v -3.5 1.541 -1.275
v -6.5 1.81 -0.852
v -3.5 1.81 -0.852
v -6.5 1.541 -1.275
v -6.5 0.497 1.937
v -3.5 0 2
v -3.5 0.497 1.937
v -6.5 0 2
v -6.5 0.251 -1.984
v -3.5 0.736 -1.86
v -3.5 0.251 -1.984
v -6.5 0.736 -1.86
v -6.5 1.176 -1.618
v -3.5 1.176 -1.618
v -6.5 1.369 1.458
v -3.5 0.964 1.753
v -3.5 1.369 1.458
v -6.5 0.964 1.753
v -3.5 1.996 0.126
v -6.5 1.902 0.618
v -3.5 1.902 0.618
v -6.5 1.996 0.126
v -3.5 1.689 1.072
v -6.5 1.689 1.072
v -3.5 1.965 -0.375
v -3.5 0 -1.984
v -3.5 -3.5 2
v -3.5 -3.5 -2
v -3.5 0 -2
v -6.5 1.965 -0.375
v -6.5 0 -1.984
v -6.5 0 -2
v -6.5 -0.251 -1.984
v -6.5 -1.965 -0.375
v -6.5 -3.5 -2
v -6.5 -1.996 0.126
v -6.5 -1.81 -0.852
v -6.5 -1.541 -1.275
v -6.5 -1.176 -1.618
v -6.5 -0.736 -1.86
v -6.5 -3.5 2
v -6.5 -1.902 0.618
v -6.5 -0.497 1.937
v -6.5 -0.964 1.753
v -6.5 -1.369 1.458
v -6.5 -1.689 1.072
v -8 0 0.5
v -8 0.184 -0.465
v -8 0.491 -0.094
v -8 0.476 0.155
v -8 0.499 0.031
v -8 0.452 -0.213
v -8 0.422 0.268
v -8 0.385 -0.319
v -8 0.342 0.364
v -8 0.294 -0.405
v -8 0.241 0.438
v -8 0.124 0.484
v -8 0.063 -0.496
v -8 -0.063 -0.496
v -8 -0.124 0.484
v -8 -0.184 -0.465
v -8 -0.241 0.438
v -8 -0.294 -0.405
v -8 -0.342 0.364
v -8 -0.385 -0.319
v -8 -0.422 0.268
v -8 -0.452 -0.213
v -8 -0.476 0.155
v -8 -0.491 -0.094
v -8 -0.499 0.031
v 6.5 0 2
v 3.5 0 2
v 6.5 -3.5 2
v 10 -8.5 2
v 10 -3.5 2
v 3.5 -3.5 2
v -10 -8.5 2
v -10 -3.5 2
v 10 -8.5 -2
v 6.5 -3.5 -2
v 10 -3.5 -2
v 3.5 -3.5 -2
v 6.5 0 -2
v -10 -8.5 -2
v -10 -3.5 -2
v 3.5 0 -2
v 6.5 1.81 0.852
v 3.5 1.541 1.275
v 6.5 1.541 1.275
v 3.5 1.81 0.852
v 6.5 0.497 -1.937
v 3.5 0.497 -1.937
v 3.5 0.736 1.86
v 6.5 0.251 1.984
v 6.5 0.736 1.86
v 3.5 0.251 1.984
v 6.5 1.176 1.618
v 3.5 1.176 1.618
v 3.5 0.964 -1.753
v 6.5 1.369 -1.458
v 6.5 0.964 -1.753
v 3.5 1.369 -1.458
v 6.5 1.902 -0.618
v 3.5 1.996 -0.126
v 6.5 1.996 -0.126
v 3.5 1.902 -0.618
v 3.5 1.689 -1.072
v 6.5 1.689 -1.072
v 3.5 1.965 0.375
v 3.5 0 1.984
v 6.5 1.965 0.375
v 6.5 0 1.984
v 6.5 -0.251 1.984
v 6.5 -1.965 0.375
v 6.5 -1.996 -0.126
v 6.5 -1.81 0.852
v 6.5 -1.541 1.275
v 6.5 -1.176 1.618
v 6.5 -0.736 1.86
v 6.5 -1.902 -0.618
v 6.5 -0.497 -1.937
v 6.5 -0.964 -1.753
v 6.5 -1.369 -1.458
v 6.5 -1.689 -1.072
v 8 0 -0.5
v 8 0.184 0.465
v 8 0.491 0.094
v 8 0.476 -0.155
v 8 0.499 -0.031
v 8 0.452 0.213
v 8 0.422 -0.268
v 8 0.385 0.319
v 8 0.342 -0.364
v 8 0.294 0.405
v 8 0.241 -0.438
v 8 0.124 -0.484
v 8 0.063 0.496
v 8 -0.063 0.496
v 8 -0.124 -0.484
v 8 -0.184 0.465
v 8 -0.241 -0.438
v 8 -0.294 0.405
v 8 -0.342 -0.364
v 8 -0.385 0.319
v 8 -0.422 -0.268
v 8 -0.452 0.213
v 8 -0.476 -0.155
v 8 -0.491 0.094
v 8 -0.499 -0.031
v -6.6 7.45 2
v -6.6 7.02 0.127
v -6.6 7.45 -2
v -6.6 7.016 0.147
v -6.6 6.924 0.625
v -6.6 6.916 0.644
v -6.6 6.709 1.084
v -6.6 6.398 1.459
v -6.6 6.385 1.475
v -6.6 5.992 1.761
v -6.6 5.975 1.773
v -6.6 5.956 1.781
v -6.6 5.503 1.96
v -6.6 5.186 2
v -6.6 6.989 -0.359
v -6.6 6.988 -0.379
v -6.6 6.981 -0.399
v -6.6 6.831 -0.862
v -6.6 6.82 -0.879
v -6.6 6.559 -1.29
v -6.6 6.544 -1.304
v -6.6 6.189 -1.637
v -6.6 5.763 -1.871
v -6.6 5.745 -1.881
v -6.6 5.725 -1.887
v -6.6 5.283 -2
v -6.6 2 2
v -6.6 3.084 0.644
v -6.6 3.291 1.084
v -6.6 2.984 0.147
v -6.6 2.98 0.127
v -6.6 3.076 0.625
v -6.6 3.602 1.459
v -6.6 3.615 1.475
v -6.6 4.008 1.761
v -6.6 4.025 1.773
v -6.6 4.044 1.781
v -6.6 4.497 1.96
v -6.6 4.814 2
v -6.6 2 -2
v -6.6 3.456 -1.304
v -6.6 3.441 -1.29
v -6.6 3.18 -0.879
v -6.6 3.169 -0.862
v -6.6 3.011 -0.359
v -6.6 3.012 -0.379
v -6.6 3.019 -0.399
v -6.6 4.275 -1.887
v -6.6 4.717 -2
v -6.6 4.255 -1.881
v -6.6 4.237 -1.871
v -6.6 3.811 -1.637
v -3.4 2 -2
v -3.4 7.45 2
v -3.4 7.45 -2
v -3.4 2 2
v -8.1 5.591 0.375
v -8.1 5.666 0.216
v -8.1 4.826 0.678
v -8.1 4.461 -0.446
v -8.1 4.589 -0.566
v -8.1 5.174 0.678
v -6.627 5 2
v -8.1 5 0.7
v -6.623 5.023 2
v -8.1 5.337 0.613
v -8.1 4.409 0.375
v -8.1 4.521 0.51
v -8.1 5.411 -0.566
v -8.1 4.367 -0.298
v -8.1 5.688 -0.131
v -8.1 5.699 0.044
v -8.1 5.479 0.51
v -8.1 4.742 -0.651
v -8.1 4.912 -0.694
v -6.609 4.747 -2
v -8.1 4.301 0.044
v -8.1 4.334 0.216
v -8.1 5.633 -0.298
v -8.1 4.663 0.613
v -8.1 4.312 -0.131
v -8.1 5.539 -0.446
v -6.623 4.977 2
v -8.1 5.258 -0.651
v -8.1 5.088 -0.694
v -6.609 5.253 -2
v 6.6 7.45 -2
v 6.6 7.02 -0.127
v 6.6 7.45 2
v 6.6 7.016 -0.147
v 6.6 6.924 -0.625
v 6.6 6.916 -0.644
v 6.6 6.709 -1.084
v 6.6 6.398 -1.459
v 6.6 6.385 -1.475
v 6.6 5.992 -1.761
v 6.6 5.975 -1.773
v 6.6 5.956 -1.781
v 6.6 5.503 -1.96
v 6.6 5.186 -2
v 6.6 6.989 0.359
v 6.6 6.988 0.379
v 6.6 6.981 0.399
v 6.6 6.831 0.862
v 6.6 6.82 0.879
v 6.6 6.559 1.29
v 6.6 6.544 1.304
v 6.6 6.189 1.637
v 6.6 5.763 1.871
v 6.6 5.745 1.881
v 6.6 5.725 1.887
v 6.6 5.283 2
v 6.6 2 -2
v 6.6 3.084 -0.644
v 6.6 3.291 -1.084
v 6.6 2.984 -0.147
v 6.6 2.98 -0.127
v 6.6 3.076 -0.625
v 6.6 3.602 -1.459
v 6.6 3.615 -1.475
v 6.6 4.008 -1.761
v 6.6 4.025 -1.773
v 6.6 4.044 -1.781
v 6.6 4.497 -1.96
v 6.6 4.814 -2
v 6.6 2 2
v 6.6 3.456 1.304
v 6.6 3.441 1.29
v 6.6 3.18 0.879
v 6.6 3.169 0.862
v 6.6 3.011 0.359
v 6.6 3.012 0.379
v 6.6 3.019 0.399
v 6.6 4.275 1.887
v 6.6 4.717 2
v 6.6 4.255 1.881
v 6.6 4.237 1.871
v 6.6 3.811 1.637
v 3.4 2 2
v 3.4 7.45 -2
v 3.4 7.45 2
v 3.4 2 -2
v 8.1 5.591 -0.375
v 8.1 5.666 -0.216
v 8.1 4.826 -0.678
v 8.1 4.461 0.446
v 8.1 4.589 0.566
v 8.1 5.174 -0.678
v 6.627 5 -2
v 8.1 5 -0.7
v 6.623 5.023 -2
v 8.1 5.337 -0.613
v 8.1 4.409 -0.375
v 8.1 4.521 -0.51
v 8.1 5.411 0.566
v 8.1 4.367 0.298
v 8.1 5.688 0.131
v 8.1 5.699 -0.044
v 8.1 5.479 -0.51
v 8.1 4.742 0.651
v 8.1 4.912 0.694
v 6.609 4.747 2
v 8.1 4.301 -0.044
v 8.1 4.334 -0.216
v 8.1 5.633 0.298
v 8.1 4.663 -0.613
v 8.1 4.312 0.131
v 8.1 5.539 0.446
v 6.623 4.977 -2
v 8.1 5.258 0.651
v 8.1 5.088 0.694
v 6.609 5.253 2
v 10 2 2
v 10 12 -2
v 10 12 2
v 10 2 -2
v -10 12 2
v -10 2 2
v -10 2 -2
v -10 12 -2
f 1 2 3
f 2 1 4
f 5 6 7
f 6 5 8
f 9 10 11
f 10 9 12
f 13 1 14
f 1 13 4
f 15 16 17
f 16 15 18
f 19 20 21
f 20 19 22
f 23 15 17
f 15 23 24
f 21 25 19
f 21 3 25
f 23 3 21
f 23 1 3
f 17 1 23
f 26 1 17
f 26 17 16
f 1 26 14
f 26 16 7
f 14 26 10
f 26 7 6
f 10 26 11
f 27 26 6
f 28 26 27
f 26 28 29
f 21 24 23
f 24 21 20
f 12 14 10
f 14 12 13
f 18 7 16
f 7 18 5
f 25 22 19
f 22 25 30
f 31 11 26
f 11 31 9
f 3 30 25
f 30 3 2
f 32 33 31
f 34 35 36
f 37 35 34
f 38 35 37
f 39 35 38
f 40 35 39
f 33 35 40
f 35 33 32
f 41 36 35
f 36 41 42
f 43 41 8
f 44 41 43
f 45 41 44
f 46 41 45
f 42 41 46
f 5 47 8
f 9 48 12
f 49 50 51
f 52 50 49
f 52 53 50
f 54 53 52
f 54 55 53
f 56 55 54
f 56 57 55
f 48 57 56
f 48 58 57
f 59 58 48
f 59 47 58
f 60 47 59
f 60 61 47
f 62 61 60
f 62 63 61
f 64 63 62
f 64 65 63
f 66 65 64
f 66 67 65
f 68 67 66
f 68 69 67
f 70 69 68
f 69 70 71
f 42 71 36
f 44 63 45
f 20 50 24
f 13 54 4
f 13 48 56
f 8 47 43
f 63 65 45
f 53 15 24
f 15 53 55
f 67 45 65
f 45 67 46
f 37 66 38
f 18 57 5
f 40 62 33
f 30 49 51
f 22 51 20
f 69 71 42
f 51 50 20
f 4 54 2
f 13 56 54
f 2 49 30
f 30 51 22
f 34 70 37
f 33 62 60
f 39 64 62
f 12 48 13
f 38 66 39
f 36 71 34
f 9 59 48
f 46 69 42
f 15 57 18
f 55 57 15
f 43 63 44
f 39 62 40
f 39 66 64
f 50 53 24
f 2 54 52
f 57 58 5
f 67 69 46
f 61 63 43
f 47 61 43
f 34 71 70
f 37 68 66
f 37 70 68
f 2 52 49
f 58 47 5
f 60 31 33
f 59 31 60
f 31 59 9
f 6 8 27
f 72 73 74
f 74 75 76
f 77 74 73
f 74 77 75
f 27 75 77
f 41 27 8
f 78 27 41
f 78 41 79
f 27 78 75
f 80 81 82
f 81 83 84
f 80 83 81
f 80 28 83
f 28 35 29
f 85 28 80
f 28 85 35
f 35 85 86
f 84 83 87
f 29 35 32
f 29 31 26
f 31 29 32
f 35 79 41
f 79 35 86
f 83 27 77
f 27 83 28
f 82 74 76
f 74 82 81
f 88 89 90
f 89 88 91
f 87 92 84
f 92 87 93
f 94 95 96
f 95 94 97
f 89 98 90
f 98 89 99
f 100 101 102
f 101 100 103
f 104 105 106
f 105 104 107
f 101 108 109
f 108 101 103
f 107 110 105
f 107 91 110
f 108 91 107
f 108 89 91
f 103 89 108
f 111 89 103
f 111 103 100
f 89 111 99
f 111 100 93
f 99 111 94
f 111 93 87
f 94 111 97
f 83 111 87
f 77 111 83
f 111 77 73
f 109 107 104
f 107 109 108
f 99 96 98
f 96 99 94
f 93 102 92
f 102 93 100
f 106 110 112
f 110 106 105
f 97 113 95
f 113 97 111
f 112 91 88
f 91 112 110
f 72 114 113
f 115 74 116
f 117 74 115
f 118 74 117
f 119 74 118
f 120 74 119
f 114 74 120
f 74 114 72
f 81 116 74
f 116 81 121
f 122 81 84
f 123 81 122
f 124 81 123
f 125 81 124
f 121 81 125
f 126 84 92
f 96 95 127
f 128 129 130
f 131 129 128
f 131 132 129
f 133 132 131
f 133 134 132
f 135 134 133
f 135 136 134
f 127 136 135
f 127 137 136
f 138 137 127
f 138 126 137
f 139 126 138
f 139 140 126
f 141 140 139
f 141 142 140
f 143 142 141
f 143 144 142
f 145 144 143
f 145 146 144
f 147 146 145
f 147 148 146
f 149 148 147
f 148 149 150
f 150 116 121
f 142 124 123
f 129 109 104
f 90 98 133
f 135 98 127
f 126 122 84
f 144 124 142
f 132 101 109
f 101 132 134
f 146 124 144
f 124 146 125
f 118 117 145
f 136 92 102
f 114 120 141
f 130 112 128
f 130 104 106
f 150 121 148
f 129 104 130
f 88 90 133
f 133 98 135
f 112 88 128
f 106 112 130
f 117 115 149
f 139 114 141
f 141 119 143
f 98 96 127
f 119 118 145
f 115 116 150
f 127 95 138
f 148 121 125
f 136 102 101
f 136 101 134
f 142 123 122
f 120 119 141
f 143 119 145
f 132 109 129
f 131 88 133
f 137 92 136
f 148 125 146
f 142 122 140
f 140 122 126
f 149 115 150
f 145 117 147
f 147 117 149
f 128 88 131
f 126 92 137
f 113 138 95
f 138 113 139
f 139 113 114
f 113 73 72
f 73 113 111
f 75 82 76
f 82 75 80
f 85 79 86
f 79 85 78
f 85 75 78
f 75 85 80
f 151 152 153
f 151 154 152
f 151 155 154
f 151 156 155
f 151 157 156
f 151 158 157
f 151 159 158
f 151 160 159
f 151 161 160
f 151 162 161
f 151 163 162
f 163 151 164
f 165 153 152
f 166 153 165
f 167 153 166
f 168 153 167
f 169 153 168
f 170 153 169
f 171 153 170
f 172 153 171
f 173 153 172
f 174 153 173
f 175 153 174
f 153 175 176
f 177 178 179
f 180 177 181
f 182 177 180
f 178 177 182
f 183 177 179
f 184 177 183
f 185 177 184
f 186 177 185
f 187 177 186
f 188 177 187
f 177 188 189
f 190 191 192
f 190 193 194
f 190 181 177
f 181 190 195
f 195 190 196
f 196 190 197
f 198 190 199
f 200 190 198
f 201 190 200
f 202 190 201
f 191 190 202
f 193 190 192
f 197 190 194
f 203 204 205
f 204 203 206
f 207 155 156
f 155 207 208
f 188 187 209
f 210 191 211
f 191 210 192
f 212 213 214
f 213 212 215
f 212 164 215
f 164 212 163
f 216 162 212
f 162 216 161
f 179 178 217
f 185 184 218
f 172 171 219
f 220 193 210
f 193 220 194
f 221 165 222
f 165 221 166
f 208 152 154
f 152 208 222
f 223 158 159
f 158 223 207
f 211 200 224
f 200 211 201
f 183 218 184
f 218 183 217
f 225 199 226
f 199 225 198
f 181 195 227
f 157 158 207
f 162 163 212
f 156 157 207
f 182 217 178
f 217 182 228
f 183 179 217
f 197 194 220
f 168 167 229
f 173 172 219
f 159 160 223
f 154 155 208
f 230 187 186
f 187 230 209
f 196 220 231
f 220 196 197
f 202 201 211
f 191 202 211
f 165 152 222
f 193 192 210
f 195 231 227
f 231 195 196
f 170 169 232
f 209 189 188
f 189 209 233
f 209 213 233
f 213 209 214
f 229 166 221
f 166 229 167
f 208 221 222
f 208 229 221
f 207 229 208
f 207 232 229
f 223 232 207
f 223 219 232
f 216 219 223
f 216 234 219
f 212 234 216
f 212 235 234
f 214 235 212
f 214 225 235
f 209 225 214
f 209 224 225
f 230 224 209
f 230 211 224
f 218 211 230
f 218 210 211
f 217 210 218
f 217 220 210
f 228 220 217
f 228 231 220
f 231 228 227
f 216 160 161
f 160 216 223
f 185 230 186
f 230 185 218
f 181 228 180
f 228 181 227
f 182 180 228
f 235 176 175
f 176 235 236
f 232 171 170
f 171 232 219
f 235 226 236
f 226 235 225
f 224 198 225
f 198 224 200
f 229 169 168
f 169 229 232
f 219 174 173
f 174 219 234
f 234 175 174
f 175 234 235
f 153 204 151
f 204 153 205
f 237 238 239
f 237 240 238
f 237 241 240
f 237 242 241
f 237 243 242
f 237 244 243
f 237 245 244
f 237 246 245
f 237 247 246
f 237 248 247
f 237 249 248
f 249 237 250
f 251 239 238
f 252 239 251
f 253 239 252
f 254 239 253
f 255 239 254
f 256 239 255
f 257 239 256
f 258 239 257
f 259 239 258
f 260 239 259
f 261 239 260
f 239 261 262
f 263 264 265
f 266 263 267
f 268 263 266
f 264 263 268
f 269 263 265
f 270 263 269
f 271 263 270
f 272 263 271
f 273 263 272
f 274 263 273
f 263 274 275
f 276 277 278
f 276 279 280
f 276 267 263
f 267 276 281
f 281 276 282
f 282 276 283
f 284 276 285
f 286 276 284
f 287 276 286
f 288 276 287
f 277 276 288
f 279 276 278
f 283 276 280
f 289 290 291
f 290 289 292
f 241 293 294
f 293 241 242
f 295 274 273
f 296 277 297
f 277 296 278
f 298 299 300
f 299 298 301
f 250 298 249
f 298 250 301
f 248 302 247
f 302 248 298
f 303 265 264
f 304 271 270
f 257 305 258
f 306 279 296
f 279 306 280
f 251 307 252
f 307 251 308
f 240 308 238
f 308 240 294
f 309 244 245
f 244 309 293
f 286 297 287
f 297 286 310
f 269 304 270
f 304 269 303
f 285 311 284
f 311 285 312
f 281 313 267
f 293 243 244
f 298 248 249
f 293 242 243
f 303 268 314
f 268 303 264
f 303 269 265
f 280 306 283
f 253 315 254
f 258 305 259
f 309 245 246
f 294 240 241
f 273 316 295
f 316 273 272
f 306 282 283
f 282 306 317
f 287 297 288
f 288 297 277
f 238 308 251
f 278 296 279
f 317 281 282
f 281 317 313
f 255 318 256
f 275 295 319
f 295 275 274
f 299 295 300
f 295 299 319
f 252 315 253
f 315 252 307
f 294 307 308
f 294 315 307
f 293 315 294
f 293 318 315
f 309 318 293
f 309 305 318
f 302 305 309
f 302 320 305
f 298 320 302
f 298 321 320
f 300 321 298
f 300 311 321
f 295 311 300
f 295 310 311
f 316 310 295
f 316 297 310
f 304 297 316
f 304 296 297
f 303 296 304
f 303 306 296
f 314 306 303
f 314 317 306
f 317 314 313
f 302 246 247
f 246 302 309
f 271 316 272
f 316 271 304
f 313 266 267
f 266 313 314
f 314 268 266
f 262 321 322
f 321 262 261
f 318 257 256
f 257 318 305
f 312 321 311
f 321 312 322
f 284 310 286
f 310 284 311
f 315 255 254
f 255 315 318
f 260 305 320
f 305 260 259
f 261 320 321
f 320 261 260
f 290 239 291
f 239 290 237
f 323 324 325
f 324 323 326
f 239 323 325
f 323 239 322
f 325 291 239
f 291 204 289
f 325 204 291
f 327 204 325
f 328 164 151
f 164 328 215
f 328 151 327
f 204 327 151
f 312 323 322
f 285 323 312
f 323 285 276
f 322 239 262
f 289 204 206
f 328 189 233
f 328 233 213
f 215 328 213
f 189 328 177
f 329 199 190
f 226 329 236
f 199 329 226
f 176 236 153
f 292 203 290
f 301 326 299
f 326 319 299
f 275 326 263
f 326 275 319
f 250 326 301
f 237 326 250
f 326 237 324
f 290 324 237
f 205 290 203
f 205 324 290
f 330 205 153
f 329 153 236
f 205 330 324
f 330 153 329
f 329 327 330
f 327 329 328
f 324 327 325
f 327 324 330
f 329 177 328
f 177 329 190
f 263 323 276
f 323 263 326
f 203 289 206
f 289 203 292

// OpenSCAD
module slot() {
	union() {
		rotate(a=[0, -90, 0]) cylinder(r=2.2, h=3.2, center=true, $fn=25);
		translate([-2.25,0,0]) rotate(a=[0, -90, 0]) cylinder(r1=2.2, r2=.7, h=1.7, center=true, $fn=25);
		translate([0, -.5,0]) cube([3.2, 5.9, 4.2], center=true);
	}
}

module tab() {
	rotate(a=[0, -90, 0]) cylinder(r=2, h=3, center=true, $fn=25);
	translate([-2.25,0,0]) rotate(a=[0, -90, 0]) cylinder(r1=2, r2=.5, h=1.5, center=true, $fn=25);
	translate([0, -1.75,0]) cube([3, 3.5, 4], center=true);
}

union() {
	translate([-5, 0, 0]) rotate(a=[0,0,0]) tab();
	translate([5, 0, 0]) rotate(a=[0,180,0]) tab();
	translate([0, -6, 0]) cube([20, 5, 4], center=true);
}

translate([0, 7, 0]) difference() {
	cube([20, 10, 4], center=true);
	translate([-5, -2, 0]) rotate(a=[0,0,0]) slot();
	translate([5, -2, 0]) rotate(a=[0,180,0]) slot();
}
